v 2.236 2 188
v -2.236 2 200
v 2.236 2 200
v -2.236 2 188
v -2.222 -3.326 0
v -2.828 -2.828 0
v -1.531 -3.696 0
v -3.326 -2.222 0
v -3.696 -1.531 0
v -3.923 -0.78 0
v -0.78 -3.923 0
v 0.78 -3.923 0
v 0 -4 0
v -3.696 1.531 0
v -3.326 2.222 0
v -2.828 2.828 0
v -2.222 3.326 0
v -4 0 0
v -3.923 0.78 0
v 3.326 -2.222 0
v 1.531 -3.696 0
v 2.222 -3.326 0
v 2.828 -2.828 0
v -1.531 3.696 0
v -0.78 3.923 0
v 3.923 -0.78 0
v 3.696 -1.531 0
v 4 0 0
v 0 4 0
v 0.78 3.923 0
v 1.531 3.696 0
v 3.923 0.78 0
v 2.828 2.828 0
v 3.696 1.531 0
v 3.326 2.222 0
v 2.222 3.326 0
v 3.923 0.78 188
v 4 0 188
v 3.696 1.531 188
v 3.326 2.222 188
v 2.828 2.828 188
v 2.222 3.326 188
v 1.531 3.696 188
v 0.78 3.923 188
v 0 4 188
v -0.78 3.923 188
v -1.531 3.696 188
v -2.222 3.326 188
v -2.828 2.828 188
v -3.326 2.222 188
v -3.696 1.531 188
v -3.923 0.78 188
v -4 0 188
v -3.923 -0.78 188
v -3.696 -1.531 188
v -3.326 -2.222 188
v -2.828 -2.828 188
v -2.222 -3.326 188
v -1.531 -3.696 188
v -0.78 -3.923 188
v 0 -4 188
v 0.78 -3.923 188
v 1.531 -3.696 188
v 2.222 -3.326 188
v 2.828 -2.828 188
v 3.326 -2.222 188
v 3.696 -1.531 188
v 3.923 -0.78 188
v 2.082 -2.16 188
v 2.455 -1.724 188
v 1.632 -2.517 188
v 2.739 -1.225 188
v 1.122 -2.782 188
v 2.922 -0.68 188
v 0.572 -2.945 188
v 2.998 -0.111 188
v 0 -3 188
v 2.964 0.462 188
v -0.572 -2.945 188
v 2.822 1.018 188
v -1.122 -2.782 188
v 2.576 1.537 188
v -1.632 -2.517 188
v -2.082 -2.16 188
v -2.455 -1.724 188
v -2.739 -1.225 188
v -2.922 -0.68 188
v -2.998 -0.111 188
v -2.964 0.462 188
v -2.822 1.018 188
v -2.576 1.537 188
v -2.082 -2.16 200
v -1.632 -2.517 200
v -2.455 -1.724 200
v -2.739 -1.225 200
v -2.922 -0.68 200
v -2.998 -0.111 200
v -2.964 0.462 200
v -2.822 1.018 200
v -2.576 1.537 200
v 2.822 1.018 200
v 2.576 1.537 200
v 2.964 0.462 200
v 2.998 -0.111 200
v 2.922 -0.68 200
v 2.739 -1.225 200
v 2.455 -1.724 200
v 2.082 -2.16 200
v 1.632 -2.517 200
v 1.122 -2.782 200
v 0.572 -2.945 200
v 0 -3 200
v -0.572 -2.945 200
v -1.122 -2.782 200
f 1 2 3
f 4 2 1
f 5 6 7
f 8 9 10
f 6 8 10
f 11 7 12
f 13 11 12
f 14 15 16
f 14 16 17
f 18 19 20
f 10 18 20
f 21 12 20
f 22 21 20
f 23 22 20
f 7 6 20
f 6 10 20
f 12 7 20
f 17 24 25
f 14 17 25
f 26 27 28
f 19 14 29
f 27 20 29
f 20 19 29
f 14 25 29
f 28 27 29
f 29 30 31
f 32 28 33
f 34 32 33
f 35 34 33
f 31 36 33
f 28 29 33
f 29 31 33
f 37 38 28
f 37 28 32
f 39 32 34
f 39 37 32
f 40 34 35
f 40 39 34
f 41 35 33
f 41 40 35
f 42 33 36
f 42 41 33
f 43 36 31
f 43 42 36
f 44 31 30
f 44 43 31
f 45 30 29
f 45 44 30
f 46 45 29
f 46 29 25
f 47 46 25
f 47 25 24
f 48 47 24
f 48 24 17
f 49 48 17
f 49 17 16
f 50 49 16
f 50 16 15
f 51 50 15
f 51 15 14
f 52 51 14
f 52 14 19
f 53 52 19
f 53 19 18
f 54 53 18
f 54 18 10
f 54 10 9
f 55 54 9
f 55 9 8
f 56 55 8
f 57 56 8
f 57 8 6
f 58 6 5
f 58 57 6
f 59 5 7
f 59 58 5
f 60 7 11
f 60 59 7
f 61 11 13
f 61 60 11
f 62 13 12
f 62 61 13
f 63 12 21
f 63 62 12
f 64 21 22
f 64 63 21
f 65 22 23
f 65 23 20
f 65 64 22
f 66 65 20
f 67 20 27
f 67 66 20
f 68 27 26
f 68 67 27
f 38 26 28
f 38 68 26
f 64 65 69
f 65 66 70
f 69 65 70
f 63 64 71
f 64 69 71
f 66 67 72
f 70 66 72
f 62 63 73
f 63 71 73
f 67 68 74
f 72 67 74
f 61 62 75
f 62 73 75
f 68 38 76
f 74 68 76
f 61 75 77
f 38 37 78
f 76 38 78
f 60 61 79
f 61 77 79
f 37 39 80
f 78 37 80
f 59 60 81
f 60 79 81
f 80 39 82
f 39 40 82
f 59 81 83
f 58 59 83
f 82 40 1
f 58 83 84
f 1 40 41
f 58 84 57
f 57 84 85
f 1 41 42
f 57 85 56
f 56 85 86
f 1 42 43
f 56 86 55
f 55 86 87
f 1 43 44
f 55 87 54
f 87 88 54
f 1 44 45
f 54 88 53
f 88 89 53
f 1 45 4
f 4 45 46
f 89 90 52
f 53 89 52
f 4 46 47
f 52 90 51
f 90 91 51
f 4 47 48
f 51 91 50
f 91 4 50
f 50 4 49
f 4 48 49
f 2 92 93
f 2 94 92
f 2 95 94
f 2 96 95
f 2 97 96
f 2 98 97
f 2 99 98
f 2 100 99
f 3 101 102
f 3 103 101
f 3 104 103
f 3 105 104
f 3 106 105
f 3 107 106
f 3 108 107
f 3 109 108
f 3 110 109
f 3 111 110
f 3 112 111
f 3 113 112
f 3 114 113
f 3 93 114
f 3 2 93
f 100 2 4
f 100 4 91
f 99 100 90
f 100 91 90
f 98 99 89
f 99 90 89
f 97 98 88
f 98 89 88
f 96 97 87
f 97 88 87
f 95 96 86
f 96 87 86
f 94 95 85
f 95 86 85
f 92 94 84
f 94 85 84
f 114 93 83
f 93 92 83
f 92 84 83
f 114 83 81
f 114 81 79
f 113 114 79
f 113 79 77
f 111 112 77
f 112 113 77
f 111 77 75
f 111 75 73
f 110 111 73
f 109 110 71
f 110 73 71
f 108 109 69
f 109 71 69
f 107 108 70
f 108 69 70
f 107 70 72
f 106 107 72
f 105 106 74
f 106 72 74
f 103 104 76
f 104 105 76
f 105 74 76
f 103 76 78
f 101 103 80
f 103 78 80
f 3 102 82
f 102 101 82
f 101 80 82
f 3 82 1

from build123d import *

# Parameters (mm, degrees)
ESBO_O1_R                  = 6.35
RESSALTO_EXTRUS_O1_DEPTH   = 200
ESBO_O2_R                  = 12.7
ESBO_O2_R_2                = 4
CORTE_EXTRUS_O1_DEPTH      = 201.201510983
CORTE_EXTRUS_O2_DEPTH      = 201.079984006
CORTE_EXTRUS_O2_DEPTH_BACK = 201.079984006
ESBO_O3_W                  = 12
ESBO_O3_H                  = 10
ESBO_O5_W                  = 12
ESBO_O5_H                  = 10


with BuildPart() as part:
    # Esboço1 → Ressalto-extrusão1 (new body)
    with BuildSketch(Plane.XY):
        Circle(ESBO_O1_R)
    extrude(amount=RESSALTO_EXTRUS_O1_DEPTH)

    # Esboço2 → Corte-extrusão1 (cut, through all)
    with BuildSketch(Plane.XY.offset(200)):
        Circle(ESBO_O2_R)
        Circle(ESBO_O2_R_2, mode=Mode.SUBTRACT)
    extrude(amount=-CORTE_EXTRUS_O1_DEPTH, mode=Mode.SUBTRACT)

    # Esboço3 → Corte-extrusão2 (cut, two sides: drawn at the far end of the back side and taken through both)
    with BuildSketch(Plane(origin=(0, 0, 0), x_dir=(0, 0, -1), z_dir=(1, 0, 0)).offset(-CORTE_EXTRUS_O2_DEPTH_BACK)):
        with Locations((-194, 7)):
            Rectangle(ESBO_O3_W, ESBO_O3_H)
    extrude(amount=CORTE_EXTRUS_O2_DEPTH + CORTE_EXTRUS_O2_DEPTH_BACK, mode=Mode.SUBTRACT)

    # Esboço5 → Corte-Revolução2 (revolve, cut)
    with BuildSketch(Plane(origin=(0, 0, 0), x_dir=(0, 0, -1), z_dir=(1, 0, 0)), mode=Mode.PRIVATE) as corte_revolu_o2_sk:
        with Locations((-194, 8)):
            Rectangle(ESBO_O5_W, ESBO_O5_H)
    revolve(corte_revolu_o2_sk.sketch.rotate(Axis((0, 0, 0), (0, 0, 1)), 270), axis=Axis((0, 0, 0), (0, 0, 1)), mode=Mode.SUBTRACT)


solid = part.part
